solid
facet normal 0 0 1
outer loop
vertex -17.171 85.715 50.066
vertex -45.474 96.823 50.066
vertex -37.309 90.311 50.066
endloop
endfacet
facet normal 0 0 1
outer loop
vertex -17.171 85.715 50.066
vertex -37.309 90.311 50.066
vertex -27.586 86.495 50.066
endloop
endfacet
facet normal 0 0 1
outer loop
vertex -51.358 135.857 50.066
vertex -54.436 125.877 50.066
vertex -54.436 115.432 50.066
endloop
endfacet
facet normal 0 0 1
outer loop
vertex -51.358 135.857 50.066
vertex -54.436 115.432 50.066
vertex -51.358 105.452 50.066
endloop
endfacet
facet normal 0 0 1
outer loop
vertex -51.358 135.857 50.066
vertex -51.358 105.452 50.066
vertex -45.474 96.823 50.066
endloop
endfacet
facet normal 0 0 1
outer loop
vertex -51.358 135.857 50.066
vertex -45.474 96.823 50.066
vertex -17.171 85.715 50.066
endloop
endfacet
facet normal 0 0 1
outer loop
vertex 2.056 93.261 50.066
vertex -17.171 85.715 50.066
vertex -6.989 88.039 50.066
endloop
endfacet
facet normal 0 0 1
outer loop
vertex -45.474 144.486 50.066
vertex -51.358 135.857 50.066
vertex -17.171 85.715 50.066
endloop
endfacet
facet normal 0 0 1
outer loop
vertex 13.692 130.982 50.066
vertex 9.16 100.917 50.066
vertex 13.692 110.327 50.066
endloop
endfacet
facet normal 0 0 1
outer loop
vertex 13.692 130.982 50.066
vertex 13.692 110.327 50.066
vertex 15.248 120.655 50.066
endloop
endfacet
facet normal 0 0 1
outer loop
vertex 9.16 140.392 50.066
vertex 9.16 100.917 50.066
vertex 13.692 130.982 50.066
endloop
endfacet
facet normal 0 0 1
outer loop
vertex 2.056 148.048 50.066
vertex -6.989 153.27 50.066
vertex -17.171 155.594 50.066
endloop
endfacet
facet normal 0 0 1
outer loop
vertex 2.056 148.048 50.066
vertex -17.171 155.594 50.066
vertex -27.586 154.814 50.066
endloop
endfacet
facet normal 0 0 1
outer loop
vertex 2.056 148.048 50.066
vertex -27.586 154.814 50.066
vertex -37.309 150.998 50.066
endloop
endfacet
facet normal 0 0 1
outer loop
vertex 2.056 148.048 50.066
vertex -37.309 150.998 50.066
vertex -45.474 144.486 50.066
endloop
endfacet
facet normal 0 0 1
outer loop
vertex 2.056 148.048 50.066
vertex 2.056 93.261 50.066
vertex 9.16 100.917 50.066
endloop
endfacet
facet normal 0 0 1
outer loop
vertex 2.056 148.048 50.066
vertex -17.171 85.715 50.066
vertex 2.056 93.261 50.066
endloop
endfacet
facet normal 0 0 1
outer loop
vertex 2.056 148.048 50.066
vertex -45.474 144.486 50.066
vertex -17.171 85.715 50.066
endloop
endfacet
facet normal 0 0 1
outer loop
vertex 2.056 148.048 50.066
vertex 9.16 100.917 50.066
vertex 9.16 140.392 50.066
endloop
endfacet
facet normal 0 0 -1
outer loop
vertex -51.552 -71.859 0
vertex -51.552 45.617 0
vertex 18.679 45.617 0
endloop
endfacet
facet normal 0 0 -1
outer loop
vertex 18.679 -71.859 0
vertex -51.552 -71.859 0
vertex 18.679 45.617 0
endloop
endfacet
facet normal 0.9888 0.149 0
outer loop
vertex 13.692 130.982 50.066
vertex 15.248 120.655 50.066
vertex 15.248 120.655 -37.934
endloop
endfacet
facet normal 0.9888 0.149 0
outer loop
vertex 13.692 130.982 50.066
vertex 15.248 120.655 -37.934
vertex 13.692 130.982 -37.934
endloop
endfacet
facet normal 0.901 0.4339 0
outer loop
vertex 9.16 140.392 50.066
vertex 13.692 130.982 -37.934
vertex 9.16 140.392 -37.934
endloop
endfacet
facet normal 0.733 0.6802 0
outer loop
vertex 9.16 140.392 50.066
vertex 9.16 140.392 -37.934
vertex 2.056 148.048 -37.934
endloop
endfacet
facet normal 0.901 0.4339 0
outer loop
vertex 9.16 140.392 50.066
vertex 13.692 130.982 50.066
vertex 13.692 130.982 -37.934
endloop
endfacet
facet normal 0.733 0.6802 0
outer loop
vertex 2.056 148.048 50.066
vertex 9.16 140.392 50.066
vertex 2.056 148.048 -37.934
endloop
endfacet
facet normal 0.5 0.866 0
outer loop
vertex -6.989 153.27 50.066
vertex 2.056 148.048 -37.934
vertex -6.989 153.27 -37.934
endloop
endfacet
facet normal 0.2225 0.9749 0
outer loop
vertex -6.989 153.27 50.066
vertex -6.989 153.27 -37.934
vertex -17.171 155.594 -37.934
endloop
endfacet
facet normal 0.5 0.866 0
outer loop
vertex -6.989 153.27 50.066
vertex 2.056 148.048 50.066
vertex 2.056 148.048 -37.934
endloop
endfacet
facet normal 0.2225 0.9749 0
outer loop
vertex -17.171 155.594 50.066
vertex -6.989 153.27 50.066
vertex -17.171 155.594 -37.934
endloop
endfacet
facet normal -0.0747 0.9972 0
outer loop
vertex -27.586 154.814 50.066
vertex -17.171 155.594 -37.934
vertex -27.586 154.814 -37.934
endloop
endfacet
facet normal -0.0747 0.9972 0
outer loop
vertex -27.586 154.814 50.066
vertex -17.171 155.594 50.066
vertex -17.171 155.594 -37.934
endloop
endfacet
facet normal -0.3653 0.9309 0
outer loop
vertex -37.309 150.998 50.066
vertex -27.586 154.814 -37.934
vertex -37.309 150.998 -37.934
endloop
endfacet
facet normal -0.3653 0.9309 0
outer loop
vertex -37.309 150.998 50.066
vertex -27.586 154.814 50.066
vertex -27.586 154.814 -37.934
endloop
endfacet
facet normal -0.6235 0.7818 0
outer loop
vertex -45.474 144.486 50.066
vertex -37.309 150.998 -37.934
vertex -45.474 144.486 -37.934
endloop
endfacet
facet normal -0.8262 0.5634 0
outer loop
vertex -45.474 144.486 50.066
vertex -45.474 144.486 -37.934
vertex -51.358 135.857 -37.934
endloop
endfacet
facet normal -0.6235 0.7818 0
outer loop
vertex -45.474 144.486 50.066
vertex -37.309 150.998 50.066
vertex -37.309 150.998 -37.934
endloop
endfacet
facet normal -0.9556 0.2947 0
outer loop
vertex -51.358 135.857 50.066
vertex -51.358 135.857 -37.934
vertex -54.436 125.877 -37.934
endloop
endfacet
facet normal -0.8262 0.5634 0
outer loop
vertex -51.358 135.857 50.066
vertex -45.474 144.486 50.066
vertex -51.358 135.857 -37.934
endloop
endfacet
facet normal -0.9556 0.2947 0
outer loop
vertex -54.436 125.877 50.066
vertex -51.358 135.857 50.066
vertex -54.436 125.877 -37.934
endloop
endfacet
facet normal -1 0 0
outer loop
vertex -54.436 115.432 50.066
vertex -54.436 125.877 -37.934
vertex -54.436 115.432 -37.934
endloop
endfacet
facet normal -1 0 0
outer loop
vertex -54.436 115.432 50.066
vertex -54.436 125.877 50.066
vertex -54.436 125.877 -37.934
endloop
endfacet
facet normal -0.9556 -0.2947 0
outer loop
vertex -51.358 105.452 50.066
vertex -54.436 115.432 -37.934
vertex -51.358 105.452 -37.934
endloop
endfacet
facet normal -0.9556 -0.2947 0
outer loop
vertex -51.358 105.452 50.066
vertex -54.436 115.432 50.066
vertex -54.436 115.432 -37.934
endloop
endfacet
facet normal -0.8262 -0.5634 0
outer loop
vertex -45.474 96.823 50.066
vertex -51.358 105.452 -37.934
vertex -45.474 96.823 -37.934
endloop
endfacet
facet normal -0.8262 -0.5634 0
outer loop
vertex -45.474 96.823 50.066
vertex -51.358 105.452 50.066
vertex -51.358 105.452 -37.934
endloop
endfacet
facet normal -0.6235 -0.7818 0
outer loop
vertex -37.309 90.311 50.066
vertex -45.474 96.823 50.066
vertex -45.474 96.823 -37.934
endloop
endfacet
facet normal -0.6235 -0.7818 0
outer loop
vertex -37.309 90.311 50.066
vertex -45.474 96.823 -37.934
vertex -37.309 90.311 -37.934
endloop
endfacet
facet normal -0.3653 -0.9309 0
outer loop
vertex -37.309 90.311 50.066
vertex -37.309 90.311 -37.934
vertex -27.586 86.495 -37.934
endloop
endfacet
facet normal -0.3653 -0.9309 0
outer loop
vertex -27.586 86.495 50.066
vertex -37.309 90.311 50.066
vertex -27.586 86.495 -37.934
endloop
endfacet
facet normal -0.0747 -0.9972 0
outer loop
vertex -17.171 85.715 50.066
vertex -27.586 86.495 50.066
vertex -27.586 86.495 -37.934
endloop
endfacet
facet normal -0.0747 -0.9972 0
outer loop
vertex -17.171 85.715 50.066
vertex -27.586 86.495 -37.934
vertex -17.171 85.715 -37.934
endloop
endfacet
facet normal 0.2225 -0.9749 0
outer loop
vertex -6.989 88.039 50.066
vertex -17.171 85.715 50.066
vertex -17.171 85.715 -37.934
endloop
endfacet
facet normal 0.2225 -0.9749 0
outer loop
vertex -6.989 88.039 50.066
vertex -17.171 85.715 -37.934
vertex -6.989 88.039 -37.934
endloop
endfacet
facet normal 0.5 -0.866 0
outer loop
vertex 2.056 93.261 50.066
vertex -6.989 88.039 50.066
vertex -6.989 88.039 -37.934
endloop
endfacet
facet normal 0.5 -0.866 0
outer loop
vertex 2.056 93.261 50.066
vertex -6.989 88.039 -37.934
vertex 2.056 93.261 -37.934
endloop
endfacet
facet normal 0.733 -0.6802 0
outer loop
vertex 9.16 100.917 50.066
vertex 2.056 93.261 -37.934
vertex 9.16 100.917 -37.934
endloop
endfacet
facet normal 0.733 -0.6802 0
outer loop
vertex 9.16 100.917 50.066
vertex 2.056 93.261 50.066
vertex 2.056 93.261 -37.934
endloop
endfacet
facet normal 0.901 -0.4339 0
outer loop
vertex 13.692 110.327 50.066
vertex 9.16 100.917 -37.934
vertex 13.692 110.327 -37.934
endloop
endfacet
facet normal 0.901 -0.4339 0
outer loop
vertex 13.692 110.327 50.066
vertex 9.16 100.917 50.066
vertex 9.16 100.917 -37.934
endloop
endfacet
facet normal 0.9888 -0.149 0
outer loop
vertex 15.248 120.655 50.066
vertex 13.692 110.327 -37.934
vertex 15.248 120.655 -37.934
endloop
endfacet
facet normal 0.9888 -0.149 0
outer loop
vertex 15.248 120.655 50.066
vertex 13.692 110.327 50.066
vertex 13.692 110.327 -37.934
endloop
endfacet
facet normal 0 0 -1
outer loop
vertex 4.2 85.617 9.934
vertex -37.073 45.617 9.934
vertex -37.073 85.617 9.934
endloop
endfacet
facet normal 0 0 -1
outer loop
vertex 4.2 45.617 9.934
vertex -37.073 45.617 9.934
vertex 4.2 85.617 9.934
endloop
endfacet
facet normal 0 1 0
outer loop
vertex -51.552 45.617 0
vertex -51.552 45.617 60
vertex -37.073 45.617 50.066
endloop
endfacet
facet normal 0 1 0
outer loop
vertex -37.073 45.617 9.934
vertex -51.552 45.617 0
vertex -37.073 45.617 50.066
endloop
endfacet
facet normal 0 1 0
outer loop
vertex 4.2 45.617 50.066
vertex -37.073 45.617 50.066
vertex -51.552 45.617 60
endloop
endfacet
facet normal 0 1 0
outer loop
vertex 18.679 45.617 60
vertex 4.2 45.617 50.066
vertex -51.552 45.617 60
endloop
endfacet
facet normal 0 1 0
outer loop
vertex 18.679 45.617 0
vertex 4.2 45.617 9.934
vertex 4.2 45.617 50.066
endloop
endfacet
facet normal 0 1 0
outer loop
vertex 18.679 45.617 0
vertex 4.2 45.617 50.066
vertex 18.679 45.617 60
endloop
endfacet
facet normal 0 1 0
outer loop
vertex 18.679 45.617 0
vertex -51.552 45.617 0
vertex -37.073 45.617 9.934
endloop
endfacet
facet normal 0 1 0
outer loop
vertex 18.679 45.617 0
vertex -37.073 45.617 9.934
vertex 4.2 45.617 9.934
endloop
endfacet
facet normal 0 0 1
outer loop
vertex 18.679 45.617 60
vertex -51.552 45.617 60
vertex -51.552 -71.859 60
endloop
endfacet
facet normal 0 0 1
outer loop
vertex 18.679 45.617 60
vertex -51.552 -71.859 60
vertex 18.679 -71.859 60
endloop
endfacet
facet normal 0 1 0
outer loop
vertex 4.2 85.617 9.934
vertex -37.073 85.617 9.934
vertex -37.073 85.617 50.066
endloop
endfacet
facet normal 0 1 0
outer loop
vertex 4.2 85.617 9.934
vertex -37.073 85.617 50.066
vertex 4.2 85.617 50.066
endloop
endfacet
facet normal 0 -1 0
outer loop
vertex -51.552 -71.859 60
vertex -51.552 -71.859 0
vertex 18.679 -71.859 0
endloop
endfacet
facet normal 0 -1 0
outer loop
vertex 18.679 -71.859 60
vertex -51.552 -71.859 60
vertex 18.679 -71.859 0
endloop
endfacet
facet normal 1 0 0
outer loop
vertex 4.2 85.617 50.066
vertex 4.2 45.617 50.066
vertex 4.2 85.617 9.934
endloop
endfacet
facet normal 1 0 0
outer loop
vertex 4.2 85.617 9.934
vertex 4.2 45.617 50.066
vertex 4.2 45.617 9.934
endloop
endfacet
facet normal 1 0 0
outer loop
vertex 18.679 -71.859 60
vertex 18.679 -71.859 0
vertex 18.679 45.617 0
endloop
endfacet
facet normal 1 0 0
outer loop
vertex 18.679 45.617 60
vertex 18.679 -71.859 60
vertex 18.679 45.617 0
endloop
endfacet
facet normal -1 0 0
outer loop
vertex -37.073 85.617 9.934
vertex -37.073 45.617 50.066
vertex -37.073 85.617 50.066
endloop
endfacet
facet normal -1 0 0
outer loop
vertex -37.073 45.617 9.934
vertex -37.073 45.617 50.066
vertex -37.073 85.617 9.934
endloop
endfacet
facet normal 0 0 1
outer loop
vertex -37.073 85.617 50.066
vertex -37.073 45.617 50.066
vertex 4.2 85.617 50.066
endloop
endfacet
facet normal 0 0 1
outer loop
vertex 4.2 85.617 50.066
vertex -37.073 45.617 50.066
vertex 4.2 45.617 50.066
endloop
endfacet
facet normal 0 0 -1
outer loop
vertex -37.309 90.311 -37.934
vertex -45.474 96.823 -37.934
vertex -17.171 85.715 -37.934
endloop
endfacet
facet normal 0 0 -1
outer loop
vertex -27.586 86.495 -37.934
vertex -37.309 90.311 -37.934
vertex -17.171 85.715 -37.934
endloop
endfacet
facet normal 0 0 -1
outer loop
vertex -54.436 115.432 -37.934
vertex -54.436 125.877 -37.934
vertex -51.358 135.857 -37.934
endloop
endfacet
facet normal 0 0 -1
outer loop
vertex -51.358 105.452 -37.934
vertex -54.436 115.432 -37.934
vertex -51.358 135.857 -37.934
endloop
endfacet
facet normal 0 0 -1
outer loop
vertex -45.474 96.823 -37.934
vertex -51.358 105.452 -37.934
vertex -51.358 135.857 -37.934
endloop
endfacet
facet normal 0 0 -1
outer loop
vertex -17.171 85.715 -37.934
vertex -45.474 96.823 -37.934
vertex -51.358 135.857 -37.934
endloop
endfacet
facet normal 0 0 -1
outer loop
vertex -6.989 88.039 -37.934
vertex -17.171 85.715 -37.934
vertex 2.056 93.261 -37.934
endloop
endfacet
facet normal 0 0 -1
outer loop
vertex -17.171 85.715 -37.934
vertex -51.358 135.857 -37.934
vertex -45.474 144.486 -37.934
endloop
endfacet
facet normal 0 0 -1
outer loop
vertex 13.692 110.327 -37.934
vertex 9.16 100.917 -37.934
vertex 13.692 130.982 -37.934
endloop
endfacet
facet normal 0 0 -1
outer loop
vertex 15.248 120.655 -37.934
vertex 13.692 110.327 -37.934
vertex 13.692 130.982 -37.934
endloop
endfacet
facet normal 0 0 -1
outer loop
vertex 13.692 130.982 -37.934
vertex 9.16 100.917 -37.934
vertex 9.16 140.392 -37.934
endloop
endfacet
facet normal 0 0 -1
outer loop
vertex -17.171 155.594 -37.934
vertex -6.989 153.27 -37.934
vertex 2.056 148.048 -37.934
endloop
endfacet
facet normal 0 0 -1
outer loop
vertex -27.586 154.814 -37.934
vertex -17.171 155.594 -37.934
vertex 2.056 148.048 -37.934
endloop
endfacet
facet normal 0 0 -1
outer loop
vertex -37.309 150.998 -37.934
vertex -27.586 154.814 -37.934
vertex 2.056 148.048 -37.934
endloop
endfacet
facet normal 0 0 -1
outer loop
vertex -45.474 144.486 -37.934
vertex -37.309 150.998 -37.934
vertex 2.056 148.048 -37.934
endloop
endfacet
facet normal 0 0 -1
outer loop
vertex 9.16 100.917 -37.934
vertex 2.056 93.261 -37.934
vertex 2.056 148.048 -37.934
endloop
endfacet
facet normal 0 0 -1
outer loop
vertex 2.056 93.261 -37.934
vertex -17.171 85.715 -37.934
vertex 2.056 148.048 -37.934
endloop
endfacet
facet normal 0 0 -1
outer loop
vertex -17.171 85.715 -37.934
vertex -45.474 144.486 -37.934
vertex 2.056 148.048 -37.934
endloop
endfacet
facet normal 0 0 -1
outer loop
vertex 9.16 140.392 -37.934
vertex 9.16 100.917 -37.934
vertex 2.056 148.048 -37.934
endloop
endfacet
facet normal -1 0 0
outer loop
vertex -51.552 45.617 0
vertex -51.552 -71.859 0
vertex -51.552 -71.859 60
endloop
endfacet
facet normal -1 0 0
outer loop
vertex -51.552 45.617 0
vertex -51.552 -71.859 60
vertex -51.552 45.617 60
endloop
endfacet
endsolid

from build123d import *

# Parameters (mm, degrees)
SKETCH1_W           = 70.230746482
SKETCH1_H           = 117.476103032
BOSS_EXTRUDE1_DEPTH = 60
SKETCH2_W           = 41.272842477
SKETCH2_H           = 40.131406686
BOSS_EXTRUDE2_DEPTH = 40
SKETCH4_R           = 35.037863264
BOSS_EXTRUDE4_DEPTH = 88


with BuildPart() as part:
    # Sketch1 → Boss-Extrude1 (new body)
    with BuildSketch(Plane.XY):
        with Locations((-16.436427192, -13.121363424)):
            Rectangle(SKETCH1_W, SKETCH1_H)
    extrude(amount=BOSS_EXTRUDE1_DEPTH)

    # Sketch2 → Boss-Extrude2 (add)
    with BuildSketch(Plane(origin=(0, 45.616688092, 0), x_dir=(1, 0, 0), z_dir=(0, 1, 0))):
        with Locations((-16.436427192, -30)):
            Rectangle(SKETCH2_W, SKETCH2_H)
    extrude(amount=BOSS_EXTRUDE2_DEPTH)


with BuildPart() as body_2:
    # Sketch4 → Boss-Extrude4 (new body)
    with BuildSketch(Plane.XY.offset(50.065703343)):
        with Locations((-19.789623092, 120.654551356)):
            Circle(SKETCH4_R)
    extrude(amount=-BOSS_EXTRUDE4_DEPTH)


solid = Compound([part.part, body_2.part])
